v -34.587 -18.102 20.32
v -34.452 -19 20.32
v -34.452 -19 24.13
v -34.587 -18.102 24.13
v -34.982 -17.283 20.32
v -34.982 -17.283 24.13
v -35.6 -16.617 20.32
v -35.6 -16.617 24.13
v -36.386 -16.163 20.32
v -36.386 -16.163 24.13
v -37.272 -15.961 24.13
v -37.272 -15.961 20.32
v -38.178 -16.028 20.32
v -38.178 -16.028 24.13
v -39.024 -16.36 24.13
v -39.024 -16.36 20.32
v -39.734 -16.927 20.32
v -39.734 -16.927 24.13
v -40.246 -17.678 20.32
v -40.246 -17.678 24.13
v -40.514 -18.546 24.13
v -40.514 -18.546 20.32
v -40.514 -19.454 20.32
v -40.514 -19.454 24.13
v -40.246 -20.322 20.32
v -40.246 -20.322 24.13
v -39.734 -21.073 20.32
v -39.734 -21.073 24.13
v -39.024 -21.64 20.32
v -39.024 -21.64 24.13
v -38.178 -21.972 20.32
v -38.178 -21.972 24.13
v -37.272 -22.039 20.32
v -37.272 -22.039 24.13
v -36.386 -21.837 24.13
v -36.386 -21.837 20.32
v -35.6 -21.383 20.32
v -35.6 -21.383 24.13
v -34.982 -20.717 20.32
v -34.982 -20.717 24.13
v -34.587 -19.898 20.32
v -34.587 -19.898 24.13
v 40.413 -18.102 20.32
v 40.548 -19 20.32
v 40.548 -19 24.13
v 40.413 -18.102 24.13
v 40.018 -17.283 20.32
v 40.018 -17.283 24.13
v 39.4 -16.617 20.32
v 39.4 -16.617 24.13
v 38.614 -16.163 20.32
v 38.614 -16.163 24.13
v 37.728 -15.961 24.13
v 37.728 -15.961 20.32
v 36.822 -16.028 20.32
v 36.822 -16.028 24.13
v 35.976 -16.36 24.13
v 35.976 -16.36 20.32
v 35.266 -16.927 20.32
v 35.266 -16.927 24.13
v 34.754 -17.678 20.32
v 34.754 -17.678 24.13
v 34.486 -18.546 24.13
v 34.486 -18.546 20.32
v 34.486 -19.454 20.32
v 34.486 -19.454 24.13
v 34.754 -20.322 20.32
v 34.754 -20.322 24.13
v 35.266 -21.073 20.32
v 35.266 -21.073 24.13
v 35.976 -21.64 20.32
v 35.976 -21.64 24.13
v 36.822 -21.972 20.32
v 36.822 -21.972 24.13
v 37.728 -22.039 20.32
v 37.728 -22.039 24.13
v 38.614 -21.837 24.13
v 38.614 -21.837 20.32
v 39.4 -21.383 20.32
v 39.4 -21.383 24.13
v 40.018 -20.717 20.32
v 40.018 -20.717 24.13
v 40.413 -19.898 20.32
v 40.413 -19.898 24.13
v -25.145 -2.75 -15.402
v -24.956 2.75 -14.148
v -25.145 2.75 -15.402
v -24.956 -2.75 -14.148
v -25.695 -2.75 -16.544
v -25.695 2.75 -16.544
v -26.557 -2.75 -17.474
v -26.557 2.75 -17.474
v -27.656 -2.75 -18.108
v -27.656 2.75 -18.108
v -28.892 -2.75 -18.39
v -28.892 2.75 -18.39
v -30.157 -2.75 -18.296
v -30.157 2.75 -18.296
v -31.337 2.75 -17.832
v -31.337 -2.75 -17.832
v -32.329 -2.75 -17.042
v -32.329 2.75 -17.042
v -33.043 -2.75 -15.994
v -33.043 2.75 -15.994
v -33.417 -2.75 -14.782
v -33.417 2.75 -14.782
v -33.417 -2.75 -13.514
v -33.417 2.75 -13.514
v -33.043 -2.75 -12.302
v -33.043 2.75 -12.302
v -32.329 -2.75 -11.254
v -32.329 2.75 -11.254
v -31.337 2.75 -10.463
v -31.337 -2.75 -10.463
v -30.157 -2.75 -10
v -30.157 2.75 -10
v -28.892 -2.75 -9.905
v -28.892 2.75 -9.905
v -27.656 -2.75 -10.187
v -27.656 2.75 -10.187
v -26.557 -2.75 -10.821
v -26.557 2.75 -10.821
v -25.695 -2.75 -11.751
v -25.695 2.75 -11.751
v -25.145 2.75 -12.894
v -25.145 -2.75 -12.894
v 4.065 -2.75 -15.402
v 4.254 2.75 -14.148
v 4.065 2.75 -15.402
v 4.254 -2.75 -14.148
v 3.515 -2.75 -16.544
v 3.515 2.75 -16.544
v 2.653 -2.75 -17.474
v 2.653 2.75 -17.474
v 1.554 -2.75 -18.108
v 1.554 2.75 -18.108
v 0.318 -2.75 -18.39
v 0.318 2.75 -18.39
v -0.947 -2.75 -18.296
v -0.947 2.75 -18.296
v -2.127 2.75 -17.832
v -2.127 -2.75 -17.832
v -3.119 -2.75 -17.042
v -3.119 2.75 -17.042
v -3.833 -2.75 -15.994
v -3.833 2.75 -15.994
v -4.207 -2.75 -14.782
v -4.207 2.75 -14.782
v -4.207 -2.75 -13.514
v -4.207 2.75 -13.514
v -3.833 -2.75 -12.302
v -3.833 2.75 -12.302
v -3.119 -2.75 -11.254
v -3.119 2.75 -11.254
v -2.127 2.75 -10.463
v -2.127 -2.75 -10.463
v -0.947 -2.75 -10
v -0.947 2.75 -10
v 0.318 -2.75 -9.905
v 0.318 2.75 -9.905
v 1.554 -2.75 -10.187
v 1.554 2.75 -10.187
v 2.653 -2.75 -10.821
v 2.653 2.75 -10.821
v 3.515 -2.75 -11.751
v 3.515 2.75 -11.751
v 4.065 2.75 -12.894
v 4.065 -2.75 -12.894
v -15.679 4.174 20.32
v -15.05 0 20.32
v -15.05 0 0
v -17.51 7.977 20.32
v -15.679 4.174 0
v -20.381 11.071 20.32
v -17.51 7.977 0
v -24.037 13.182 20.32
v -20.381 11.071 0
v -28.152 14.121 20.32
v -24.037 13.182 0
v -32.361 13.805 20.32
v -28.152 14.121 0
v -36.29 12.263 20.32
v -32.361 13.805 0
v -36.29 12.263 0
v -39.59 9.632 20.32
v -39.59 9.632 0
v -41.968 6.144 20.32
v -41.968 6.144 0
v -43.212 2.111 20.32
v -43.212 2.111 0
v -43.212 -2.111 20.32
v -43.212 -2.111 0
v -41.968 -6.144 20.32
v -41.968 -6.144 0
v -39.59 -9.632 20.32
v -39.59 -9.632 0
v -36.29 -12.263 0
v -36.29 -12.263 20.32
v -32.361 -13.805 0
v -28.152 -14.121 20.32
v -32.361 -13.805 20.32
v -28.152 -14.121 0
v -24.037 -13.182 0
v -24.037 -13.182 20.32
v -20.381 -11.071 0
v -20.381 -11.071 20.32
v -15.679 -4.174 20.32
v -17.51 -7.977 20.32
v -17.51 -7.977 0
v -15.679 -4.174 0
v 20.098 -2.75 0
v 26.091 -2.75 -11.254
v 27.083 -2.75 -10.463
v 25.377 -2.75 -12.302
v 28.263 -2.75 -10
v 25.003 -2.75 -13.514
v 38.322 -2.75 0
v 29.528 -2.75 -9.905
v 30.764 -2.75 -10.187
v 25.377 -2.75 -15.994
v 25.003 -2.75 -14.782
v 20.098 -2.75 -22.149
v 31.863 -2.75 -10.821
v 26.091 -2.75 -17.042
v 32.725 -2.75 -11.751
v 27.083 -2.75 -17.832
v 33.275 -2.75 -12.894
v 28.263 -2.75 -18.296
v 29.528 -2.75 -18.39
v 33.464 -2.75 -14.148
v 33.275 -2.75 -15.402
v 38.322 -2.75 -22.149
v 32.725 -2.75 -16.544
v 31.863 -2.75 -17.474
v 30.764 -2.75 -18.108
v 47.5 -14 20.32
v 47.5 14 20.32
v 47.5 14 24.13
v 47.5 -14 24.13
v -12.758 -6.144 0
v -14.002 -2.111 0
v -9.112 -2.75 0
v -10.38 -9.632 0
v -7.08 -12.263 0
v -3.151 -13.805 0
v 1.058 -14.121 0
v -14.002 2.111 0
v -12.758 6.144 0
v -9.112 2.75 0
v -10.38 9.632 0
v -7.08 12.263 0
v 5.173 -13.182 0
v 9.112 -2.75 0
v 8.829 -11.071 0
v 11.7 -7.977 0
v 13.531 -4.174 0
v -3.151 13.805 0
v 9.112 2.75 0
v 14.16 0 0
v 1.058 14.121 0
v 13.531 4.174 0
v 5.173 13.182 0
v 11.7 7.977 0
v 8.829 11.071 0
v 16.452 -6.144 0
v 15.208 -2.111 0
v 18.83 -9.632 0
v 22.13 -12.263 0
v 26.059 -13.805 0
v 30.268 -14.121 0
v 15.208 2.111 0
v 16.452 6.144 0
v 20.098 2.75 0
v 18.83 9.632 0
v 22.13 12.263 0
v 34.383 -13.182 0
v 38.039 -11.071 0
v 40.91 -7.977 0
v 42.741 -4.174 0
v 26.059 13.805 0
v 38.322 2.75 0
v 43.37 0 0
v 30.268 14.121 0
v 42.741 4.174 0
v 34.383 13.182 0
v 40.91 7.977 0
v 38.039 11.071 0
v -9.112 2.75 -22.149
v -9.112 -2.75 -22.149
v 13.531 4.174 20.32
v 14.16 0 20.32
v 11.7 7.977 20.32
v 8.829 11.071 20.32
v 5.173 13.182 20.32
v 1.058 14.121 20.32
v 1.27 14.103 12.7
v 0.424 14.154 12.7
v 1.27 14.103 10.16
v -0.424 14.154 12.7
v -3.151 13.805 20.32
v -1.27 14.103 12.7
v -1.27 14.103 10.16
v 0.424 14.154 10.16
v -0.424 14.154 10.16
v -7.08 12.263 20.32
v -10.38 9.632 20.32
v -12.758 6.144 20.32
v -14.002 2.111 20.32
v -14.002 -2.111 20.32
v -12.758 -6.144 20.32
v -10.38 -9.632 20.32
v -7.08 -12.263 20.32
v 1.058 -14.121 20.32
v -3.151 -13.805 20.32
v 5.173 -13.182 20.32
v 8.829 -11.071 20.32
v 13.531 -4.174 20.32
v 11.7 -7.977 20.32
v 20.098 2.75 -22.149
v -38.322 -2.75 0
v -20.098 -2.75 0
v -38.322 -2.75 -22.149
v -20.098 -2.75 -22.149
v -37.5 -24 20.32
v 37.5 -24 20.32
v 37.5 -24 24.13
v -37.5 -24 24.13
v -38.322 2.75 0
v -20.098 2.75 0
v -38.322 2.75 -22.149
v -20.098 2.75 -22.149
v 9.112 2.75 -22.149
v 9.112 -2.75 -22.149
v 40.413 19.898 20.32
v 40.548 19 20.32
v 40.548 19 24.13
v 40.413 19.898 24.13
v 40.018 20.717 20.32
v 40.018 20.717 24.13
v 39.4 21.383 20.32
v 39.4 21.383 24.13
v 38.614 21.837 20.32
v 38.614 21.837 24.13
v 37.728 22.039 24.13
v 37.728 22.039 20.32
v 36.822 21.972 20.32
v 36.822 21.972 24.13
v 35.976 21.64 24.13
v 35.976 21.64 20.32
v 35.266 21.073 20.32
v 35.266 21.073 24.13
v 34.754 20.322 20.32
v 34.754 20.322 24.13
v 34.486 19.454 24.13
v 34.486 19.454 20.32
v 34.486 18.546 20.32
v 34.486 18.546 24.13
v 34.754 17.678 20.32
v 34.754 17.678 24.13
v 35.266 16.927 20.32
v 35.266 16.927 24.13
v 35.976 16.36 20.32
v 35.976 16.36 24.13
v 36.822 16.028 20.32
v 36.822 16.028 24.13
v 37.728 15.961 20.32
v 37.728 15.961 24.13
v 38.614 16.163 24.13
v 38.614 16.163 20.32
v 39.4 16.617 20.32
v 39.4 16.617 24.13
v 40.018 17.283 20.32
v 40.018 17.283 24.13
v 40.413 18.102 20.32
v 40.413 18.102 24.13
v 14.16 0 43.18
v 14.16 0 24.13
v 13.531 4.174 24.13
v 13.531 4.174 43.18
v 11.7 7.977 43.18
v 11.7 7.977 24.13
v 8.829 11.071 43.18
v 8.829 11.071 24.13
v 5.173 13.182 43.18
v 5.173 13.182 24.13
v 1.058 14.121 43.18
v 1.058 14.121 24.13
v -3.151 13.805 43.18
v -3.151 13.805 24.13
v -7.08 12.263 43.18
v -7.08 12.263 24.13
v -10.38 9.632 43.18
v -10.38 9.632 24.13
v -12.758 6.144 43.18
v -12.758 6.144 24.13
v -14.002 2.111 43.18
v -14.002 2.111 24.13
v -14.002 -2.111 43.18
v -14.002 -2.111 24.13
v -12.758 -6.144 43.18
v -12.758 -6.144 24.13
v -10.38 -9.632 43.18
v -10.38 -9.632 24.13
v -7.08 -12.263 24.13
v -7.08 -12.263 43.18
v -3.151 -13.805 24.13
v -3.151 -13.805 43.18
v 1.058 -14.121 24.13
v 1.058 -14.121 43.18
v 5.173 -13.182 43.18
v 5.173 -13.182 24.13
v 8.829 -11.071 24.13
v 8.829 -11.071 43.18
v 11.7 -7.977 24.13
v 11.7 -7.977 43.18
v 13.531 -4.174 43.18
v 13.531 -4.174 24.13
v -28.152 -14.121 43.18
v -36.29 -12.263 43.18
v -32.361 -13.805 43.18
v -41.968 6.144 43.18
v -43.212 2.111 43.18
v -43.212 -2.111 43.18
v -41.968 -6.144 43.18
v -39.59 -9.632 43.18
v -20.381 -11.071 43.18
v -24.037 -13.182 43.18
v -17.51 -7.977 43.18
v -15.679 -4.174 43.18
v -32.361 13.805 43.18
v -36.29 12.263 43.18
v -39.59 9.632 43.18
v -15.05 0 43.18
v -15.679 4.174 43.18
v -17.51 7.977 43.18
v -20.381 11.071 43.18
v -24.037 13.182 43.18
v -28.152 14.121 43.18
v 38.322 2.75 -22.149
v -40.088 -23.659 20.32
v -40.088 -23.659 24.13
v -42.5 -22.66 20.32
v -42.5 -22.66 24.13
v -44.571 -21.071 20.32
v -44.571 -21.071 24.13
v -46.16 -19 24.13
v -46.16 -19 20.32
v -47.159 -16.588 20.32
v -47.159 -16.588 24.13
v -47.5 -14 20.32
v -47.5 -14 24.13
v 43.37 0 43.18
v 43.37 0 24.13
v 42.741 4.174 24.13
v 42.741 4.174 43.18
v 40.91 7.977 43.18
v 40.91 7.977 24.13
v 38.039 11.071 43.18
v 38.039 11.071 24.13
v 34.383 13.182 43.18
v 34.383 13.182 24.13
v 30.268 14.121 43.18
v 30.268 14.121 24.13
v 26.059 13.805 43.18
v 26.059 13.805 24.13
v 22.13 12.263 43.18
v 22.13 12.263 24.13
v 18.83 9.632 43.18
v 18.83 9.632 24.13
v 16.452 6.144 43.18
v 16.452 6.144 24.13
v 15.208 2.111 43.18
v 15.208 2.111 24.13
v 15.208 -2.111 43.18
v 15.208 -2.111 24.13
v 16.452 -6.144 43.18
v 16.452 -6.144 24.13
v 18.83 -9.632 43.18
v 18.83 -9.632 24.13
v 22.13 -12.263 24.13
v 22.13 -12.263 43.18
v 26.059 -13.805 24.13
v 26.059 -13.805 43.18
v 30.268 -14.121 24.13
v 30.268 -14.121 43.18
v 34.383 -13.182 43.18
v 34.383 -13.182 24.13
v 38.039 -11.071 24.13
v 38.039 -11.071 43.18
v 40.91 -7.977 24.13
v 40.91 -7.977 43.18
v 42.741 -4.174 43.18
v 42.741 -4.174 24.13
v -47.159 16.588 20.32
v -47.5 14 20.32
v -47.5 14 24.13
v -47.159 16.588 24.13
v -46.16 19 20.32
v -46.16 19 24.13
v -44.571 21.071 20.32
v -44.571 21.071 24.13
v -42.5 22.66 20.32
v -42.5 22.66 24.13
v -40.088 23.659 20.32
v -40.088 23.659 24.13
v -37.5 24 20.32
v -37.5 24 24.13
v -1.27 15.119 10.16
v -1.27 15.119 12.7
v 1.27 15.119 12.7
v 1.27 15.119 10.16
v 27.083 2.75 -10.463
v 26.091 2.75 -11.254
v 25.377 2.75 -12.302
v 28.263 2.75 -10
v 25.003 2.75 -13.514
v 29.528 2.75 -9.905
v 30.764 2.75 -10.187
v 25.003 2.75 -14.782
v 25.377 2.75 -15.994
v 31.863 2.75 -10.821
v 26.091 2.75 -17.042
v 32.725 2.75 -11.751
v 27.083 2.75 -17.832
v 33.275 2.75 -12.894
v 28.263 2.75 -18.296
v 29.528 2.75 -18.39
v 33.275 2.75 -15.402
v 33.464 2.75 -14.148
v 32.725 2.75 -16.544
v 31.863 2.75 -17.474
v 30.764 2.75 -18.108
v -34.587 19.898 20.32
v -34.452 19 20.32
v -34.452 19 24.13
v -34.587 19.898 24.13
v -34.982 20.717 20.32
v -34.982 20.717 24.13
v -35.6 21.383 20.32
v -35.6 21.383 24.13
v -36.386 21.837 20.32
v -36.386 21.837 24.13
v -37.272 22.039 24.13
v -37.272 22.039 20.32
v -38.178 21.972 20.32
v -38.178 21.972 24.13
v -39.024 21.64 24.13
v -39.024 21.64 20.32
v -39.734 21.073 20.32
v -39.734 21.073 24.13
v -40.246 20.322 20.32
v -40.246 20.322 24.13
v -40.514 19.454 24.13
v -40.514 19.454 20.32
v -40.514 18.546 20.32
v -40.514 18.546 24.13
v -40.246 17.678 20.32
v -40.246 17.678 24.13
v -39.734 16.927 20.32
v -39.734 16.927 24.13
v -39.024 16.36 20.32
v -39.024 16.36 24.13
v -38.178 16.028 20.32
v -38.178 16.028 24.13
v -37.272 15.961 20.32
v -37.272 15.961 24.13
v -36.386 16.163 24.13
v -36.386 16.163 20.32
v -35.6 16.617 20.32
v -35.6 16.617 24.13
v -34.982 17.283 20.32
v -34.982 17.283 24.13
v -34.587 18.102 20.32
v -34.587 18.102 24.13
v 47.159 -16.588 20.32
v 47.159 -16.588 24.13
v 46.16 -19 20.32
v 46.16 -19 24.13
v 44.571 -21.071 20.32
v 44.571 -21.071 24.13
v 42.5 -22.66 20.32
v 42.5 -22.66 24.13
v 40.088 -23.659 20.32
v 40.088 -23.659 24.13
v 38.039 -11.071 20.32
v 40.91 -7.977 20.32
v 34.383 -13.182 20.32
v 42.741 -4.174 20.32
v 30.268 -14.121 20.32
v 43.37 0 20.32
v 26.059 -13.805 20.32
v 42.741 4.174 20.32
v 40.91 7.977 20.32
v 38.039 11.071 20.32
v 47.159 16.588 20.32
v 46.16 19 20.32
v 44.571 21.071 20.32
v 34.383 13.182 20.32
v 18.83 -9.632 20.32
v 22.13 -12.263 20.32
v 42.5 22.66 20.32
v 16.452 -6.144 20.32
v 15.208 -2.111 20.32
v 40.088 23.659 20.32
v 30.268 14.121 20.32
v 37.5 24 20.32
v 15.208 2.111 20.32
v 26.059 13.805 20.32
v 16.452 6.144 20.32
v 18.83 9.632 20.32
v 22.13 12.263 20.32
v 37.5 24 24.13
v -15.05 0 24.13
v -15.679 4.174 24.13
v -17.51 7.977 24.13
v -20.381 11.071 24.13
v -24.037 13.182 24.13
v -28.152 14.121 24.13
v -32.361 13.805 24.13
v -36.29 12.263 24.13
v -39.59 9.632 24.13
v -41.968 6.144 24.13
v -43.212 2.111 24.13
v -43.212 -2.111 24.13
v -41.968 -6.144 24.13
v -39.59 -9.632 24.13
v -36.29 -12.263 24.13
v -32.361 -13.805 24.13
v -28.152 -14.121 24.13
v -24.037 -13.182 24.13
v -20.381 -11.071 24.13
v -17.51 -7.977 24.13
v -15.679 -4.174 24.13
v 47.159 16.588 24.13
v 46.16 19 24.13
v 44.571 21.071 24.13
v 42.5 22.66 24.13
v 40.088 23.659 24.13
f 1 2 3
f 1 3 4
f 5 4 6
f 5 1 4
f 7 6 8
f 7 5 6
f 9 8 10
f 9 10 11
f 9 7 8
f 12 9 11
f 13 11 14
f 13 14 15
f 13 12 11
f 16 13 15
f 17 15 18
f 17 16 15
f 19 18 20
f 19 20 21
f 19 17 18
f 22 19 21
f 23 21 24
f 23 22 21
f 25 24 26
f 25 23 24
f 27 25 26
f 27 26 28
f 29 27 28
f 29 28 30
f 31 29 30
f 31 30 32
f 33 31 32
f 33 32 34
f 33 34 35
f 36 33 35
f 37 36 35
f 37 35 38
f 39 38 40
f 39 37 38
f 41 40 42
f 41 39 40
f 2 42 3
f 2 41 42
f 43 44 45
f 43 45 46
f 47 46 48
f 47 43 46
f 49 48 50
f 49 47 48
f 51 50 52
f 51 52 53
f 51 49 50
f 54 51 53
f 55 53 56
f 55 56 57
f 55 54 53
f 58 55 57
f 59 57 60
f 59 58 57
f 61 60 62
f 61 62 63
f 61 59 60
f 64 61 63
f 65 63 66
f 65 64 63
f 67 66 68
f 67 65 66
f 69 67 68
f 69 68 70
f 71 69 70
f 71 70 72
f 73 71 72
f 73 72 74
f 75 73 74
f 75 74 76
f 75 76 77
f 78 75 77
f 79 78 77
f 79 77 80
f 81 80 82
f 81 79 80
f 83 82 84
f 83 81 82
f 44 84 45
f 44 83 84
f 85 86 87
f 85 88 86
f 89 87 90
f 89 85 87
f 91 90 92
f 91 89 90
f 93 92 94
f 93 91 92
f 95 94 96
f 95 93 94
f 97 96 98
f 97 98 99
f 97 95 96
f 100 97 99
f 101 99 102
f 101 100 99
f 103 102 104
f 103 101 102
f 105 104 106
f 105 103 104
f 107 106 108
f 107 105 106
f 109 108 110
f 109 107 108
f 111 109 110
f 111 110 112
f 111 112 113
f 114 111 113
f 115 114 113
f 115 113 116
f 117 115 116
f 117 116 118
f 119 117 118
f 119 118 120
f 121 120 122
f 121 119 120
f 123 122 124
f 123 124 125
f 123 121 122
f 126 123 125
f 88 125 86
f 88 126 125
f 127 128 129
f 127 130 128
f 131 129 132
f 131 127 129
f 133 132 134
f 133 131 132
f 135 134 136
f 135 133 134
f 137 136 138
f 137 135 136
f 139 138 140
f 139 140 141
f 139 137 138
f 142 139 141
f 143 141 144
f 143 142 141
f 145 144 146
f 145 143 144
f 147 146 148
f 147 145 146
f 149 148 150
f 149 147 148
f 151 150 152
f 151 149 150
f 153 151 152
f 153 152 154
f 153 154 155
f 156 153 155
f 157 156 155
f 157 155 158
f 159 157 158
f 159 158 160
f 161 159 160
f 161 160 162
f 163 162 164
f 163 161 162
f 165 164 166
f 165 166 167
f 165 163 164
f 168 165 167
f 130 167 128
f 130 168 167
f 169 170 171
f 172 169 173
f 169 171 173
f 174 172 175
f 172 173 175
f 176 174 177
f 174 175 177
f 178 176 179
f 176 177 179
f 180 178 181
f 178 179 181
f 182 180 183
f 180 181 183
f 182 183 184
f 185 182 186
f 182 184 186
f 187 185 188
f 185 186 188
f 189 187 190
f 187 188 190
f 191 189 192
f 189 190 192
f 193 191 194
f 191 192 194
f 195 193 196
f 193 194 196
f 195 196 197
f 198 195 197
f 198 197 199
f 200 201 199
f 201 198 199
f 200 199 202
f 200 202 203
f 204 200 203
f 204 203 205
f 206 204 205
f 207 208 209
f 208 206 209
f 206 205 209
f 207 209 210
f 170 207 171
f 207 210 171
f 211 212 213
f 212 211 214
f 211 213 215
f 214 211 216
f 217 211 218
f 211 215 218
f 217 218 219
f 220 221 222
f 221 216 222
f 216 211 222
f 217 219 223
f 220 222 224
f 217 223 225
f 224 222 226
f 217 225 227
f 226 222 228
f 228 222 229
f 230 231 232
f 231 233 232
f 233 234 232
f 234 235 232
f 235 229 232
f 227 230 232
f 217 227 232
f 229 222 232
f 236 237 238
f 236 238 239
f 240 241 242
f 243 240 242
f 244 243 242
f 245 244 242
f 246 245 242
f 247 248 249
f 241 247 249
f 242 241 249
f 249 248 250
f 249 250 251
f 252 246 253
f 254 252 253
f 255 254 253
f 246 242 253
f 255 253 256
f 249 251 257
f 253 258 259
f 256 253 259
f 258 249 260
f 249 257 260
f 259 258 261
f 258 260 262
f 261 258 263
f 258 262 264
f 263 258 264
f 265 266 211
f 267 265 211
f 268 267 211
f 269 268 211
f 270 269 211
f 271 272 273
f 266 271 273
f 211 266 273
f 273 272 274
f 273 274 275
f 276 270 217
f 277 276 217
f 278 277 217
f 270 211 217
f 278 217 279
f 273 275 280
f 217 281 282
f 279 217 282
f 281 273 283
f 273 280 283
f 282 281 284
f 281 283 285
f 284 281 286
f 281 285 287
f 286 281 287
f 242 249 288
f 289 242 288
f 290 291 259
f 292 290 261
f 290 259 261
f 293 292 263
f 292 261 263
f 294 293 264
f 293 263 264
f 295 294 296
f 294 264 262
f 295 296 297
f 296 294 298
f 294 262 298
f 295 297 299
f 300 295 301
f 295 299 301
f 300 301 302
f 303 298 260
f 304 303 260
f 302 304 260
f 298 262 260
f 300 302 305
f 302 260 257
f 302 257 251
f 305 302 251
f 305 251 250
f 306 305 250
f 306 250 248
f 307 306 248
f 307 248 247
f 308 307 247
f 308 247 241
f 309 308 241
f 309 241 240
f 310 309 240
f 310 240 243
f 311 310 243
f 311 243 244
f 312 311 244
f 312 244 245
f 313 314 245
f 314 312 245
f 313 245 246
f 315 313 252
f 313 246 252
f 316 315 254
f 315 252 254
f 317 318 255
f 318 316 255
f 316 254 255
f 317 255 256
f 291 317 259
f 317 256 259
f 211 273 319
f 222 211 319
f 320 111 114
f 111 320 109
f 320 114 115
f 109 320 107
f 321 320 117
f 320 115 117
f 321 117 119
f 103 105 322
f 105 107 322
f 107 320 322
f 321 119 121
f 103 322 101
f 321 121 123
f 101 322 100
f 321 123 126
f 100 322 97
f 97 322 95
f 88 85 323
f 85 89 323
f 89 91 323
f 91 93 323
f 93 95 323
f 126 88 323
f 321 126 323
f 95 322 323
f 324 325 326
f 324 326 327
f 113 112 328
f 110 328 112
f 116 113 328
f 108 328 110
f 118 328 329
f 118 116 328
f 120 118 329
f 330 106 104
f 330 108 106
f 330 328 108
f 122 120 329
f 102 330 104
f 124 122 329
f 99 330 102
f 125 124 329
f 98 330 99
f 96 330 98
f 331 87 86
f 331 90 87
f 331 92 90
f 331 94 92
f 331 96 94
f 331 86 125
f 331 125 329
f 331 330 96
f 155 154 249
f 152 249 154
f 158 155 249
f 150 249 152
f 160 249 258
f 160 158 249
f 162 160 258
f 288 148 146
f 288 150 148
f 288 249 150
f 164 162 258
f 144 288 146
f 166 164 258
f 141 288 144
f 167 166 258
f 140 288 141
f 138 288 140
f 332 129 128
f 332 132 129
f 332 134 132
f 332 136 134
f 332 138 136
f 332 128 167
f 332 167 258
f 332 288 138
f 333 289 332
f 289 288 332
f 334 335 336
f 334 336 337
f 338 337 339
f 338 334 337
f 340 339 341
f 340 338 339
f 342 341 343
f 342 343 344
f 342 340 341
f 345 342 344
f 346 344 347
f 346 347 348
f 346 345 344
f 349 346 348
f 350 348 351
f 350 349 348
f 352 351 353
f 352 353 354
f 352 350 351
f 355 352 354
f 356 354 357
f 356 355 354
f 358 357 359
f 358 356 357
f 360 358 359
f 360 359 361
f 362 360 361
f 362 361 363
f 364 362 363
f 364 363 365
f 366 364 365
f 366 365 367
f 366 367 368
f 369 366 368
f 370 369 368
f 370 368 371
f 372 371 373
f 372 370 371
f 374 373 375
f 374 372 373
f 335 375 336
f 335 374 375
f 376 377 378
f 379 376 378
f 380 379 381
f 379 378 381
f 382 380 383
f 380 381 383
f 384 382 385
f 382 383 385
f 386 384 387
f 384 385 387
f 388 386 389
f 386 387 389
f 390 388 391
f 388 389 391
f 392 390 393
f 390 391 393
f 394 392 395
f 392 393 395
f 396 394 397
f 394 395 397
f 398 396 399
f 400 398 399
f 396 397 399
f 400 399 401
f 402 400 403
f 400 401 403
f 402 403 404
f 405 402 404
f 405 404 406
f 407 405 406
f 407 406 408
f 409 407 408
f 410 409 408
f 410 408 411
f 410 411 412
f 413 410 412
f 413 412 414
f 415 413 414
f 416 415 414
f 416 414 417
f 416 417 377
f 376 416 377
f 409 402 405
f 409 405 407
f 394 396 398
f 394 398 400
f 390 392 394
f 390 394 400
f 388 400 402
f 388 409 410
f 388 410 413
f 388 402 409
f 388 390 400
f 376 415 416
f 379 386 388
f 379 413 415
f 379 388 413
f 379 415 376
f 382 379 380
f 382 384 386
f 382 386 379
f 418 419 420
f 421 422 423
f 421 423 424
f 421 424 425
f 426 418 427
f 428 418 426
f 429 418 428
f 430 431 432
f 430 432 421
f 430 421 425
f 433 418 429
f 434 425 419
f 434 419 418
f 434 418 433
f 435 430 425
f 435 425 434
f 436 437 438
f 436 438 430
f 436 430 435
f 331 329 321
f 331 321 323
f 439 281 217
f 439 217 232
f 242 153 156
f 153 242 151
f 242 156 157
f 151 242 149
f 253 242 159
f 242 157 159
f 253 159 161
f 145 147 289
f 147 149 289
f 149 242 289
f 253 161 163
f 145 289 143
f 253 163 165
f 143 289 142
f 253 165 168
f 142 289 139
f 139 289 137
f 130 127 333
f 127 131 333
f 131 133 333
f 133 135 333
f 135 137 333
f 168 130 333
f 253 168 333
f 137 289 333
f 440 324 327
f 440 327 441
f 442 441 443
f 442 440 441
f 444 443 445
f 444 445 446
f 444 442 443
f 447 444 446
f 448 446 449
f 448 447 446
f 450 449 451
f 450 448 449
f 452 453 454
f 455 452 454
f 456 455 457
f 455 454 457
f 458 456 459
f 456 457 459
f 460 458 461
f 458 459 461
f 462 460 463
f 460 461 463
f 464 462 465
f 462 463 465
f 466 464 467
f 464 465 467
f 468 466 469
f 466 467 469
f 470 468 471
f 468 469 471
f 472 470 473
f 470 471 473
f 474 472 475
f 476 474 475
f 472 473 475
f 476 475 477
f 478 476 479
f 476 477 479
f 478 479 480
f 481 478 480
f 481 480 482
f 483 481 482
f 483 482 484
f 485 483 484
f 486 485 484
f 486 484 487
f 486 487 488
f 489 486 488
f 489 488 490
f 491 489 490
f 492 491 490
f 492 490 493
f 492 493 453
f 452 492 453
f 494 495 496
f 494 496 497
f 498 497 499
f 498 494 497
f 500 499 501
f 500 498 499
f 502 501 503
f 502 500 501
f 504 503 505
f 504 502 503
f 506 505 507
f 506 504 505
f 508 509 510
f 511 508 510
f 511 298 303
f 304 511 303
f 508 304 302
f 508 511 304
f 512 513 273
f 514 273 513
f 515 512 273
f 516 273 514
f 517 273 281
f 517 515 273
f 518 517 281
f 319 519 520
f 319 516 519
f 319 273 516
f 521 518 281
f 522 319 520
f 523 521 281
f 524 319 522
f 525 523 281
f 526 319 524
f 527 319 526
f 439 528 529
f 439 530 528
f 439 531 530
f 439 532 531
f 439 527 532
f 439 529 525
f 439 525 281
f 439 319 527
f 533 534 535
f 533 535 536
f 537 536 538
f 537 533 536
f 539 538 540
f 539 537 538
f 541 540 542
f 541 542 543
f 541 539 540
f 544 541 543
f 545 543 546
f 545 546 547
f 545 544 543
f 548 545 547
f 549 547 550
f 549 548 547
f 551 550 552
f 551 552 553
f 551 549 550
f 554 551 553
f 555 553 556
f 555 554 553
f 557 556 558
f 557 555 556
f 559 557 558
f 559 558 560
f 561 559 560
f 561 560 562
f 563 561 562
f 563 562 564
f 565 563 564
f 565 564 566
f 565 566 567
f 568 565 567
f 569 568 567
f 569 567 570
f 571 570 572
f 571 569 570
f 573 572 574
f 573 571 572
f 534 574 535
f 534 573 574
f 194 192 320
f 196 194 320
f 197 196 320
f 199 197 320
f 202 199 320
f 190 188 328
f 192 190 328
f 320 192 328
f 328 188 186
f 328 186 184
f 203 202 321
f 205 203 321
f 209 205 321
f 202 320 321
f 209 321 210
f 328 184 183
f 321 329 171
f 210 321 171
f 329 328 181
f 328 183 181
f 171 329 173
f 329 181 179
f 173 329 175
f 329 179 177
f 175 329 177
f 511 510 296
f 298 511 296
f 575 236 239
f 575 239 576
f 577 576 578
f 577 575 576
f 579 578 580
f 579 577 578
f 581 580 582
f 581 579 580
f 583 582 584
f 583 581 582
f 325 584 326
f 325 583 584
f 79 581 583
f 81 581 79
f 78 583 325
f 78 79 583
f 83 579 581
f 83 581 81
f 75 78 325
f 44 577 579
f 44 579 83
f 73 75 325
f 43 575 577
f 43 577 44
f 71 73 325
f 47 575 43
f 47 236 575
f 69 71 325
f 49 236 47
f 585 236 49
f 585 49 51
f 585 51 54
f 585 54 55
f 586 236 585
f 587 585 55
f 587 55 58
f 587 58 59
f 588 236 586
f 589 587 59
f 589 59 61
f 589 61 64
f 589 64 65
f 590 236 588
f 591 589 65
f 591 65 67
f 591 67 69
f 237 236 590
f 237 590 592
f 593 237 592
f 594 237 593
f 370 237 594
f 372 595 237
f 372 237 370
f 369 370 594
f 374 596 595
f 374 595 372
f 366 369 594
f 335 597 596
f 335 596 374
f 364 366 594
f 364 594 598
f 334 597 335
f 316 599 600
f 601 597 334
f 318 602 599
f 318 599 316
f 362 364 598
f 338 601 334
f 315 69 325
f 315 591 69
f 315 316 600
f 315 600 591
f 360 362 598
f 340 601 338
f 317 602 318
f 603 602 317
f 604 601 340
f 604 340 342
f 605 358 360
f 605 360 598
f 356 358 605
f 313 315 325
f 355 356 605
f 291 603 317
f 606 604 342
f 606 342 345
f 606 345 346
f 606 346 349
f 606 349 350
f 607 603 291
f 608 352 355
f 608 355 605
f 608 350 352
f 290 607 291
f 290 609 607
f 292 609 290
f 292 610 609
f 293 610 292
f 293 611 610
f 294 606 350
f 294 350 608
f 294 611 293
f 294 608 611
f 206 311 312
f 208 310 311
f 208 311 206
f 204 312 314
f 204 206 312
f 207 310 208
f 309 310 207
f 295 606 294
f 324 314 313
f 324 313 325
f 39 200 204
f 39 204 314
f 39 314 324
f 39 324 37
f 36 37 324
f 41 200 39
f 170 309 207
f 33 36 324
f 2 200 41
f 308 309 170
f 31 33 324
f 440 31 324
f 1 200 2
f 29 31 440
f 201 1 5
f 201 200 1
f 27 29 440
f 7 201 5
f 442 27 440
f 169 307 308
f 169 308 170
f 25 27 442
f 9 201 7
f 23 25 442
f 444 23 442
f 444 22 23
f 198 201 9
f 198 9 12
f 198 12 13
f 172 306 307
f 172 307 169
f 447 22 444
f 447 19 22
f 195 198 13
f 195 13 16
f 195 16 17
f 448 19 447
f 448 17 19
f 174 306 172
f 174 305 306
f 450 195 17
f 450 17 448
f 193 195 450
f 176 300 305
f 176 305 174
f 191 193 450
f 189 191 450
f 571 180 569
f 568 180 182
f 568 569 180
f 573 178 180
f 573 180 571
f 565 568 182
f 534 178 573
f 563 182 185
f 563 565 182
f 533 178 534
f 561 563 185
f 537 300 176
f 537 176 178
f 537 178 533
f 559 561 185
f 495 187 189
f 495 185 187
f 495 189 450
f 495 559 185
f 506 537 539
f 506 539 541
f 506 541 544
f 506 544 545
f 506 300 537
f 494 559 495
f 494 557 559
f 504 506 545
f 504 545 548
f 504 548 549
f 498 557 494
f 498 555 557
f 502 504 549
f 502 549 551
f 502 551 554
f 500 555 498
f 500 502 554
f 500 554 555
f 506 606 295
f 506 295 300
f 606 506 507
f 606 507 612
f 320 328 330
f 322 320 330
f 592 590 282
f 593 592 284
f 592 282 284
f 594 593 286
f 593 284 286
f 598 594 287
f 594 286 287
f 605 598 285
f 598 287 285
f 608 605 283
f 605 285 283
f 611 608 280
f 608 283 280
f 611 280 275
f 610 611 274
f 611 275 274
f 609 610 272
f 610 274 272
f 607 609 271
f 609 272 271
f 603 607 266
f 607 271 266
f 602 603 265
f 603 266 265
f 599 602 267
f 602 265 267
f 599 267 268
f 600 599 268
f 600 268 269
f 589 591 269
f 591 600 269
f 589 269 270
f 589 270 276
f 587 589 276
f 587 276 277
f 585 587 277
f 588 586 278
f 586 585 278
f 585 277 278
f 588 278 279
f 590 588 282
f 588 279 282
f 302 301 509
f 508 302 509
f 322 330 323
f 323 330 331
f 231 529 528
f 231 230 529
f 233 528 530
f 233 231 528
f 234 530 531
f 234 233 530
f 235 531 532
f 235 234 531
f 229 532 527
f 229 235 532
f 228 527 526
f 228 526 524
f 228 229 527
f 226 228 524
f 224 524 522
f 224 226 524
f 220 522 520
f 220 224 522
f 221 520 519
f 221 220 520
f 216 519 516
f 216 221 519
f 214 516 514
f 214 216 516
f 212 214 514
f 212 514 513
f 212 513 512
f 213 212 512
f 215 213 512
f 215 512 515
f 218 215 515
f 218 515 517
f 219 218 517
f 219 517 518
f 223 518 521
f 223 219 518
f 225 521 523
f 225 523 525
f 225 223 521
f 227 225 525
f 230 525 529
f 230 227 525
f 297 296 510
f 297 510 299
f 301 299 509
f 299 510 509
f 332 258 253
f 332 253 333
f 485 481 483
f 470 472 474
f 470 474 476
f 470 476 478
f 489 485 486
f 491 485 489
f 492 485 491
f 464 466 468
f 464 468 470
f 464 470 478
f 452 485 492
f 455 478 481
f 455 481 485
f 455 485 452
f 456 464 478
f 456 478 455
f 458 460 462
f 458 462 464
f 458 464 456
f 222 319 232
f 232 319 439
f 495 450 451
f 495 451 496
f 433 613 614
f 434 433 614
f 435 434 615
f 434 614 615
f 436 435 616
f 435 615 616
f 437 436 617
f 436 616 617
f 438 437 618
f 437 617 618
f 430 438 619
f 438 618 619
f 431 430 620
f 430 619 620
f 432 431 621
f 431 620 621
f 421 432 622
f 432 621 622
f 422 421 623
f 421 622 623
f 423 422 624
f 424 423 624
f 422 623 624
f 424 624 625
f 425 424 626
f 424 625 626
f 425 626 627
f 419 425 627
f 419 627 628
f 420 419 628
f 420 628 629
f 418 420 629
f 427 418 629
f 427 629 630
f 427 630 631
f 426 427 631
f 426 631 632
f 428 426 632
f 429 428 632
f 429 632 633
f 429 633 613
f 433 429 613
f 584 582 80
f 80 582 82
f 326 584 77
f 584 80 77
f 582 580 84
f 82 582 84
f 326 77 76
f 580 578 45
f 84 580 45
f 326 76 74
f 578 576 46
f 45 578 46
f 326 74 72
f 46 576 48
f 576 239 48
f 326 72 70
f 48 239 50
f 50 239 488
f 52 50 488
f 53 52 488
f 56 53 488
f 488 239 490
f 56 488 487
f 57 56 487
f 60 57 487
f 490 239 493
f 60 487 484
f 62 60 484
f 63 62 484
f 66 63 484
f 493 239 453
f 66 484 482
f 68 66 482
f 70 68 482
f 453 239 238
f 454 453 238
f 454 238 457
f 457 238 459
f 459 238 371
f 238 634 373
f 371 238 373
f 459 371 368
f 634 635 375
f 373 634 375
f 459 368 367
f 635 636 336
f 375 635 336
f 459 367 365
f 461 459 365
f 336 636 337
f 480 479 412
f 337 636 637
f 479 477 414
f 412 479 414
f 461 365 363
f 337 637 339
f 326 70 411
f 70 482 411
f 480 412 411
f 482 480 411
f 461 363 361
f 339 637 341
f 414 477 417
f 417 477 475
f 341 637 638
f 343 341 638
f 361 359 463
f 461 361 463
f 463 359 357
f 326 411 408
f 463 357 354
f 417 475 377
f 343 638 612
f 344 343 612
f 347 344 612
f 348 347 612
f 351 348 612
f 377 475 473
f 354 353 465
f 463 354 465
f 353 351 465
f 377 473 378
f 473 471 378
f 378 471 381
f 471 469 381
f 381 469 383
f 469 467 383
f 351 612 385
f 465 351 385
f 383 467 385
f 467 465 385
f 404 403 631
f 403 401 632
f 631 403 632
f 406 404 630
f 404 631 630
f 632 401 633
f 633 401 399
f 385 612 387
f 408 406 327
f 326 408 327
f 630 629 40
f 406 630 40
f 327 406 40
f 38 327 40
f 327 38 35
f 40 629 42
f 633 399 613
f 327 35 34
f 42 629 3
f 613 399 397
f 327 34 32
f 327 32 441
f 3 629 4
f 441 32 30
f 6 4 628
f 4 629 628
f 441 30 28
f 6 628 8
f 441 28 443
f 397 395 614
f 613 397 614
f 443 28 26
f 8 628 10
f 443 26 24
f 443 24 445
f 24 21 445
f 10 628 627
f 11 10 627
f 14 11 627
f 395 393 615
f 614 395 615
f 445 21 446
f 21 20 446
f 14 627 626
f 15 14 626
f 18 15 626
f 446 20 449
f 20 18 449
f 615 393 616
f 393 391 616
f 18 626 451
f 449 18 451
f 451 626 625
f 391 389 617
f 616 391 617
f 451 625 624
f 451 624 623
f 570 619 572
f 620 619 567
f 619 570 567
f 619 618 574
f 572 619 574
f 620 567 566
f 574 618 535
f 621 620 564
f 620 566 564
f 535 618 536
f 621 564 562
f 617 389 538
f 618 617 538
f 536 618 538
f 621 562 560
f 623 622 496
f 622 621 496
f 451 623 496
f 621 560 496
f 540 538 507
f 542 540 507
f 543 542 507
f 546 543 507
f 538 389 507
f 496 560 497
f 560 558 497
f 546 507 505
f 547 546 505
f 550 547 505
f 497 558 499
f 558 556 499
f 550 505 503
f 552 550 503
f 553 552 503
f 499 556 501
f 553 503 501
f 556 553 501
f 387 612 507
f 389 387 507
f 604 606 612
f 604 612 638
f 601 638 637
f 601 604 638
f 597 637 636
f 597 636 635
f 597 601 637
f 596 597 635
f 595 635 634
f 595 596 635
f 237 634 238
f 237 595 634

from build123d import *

# Parameters (mm, degrees)
SKETCH1_R                = 14.1605
BOSS_EXTRUDE1_DEPTH      = 43.18
SKETCH3_W                = 18.2245
SKETCH3_H                = 22.1488
SKETCH3_R                = 4.2545
BOSS_EXTRUDE2_DEPTH      = 2.74955
BOSS_EXTRUDE2_DEPTH_BACK = 2.74955
LPATTERN1_COUNT          = 2
LPATTERN1_PITCH          = 29.21
LPATTERN1_2_COUNT        = 2
LPATTERN1_2_PITCH        = 29.21
BOSS_EXTRUDE3_START      = 20.32
SKETCH4_R                = 3.048
BOSS_EXTRUDE3_DEPTH      = 3.81
BOSS_EXTRUDE4_START      = -30.48
BOSS_EXTRUDE4_DEPTH      = 2.54


with BuildPart() as part:
    # Sketch1 → Boss-Extrude1 (new body)
    with BuildSketch(Plane.XY):
        Circle(SKETCH1_R)
    extrude(amount=BOSS_EXTRUDE1_DEPTH)

    # Sketch3 → Boss-Extrude2 (add, two sides)
    with BuildSketch(Plane(origin=(0, 0, 0), x_dir=(1, 0, 0), z_dir=(0, 1, 0))) as boss_extrude2_sk:
        with Locations((0, 11.0744)):
            Rectangle(SKETCH3_W, SKETCH3_H)
        with Locations((0, 14.1478)):
            Circle(SKETCH3_R, mode=Mode.SUBTRACT)
    extrude(amount=BOSS_EXTRUDE2_DEPTH)
    extrude(boss_extrude2_sk.sketch, amount=-BOSS_EXTRUDE2_DEPTH_BACK)


with BuildPart() as lpattern1_1:
    # LPattern1: pattern copy
    add(part.part.moved(Location(Vector(1, 0, 0) * (1 * LPATTERN1_PITCH))))


with BuildPart() as lpattern1_2_1:
    # LPattern1 2: pattern copy
    add(part.part.moved(Location(Vector(-1, 0, 0) * (1 * LPATTERN1_2_PITCH))))


with BuildPart() as lpattern1_2_2:
    # LPattern1 2: pattern copy
    add(lpattern1_1.part.moved(Location(Vector(-1, 0, 0) * (1 * LPATTERN1_2_PITCH))))


with BuildPart() as part_1:
    add(part.part)

    add(lpattern1_1.part)  # Boss-Extrude3 merges LPattern1_1

    add(lpattern1_2_1.part)  # Boss-Extrude3 merges LPattern1 2_1

    add(lpattern1_2_2.part)  # Boss-Extrude3 merges LPattern1 2_2
    # Sketch4 → Boss-Extrude3 (add)
    with BuildSketch(Plane.XY.offset(BOSS_EXTRUDE3_START)):
        with BuildLine():
            Line((-37.5, 24), (37.5, 24))
            ThreePointArc((37.5, 24), (44.571067812, 21.071067812), (47.5, 14))
            Line((47.5, 14), (47.5, -14))
            ThreePointArc((47.5, -14), (44.571067812, -21.071067812), (37.5, -24))
            Line((37.5, -24), (-37.5, -24))
            ThreePointArc((-37.5, -24), (-44.571067812, -21.071067812), (-47.5, -14))
            Line((-47.5, -14), (-47.5, 14))
            ThreePointArc((-47.5, 14), (-44.571067812, 21.071067812), (-37.5, 24))
        make_face()
        with Locations((-37.5, 19)):
            Circle(SKETCH4_R, mode=Mode.SUBTRACT)
        with Locations((37.5, 19)):
            Circle(SKETCH4_R, mode=Mode.SUBTRACT)
        with Locations((37.5, -19)):
            Circle(SKETCH4_R, mode=Mode.SUBTRACT)
        with Locations((-37.5, -19)):
            Circle(SKETCH4_R, mode=Mode.SUBTRACT)
    extrude(amount=BOSS_EXTRUDE3_DEPTH)

    # Sketch6 → Boss-Extrude4 (add)
    with BuildSketch(Plane.XY.offset(43.18).offset(BOSS_EXTRUDE4_START)):
        with BuildLine():
            Line((-1.27, 14.103434342), (-1.27, 15.119434342))
            Line((-1.27, 15.119434342), (1.27, 15.119434342))
            Line((1.27, 15.119434342), (1.27, 14.103434342))
            ThreePointArc((1.27, 14.103434342), (0, 14.1605), (-1.27, 14.103434342))
        make_face()
    extrude(amount=-BOSS_EXTRUDE4_DEPTH)


solid = part_1.part
